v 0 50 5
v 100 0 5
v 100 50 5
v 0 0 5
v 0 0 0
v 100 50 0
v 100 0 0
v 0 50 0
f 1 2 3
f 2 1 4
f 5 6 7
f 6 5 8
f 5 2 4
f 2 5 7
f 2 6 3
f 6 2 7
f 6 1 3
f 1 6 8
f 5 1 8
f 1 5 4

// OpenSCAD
// dimensions in millimeter [width, depth, height]
plate = [100, 50, 5];

cube(plate);
